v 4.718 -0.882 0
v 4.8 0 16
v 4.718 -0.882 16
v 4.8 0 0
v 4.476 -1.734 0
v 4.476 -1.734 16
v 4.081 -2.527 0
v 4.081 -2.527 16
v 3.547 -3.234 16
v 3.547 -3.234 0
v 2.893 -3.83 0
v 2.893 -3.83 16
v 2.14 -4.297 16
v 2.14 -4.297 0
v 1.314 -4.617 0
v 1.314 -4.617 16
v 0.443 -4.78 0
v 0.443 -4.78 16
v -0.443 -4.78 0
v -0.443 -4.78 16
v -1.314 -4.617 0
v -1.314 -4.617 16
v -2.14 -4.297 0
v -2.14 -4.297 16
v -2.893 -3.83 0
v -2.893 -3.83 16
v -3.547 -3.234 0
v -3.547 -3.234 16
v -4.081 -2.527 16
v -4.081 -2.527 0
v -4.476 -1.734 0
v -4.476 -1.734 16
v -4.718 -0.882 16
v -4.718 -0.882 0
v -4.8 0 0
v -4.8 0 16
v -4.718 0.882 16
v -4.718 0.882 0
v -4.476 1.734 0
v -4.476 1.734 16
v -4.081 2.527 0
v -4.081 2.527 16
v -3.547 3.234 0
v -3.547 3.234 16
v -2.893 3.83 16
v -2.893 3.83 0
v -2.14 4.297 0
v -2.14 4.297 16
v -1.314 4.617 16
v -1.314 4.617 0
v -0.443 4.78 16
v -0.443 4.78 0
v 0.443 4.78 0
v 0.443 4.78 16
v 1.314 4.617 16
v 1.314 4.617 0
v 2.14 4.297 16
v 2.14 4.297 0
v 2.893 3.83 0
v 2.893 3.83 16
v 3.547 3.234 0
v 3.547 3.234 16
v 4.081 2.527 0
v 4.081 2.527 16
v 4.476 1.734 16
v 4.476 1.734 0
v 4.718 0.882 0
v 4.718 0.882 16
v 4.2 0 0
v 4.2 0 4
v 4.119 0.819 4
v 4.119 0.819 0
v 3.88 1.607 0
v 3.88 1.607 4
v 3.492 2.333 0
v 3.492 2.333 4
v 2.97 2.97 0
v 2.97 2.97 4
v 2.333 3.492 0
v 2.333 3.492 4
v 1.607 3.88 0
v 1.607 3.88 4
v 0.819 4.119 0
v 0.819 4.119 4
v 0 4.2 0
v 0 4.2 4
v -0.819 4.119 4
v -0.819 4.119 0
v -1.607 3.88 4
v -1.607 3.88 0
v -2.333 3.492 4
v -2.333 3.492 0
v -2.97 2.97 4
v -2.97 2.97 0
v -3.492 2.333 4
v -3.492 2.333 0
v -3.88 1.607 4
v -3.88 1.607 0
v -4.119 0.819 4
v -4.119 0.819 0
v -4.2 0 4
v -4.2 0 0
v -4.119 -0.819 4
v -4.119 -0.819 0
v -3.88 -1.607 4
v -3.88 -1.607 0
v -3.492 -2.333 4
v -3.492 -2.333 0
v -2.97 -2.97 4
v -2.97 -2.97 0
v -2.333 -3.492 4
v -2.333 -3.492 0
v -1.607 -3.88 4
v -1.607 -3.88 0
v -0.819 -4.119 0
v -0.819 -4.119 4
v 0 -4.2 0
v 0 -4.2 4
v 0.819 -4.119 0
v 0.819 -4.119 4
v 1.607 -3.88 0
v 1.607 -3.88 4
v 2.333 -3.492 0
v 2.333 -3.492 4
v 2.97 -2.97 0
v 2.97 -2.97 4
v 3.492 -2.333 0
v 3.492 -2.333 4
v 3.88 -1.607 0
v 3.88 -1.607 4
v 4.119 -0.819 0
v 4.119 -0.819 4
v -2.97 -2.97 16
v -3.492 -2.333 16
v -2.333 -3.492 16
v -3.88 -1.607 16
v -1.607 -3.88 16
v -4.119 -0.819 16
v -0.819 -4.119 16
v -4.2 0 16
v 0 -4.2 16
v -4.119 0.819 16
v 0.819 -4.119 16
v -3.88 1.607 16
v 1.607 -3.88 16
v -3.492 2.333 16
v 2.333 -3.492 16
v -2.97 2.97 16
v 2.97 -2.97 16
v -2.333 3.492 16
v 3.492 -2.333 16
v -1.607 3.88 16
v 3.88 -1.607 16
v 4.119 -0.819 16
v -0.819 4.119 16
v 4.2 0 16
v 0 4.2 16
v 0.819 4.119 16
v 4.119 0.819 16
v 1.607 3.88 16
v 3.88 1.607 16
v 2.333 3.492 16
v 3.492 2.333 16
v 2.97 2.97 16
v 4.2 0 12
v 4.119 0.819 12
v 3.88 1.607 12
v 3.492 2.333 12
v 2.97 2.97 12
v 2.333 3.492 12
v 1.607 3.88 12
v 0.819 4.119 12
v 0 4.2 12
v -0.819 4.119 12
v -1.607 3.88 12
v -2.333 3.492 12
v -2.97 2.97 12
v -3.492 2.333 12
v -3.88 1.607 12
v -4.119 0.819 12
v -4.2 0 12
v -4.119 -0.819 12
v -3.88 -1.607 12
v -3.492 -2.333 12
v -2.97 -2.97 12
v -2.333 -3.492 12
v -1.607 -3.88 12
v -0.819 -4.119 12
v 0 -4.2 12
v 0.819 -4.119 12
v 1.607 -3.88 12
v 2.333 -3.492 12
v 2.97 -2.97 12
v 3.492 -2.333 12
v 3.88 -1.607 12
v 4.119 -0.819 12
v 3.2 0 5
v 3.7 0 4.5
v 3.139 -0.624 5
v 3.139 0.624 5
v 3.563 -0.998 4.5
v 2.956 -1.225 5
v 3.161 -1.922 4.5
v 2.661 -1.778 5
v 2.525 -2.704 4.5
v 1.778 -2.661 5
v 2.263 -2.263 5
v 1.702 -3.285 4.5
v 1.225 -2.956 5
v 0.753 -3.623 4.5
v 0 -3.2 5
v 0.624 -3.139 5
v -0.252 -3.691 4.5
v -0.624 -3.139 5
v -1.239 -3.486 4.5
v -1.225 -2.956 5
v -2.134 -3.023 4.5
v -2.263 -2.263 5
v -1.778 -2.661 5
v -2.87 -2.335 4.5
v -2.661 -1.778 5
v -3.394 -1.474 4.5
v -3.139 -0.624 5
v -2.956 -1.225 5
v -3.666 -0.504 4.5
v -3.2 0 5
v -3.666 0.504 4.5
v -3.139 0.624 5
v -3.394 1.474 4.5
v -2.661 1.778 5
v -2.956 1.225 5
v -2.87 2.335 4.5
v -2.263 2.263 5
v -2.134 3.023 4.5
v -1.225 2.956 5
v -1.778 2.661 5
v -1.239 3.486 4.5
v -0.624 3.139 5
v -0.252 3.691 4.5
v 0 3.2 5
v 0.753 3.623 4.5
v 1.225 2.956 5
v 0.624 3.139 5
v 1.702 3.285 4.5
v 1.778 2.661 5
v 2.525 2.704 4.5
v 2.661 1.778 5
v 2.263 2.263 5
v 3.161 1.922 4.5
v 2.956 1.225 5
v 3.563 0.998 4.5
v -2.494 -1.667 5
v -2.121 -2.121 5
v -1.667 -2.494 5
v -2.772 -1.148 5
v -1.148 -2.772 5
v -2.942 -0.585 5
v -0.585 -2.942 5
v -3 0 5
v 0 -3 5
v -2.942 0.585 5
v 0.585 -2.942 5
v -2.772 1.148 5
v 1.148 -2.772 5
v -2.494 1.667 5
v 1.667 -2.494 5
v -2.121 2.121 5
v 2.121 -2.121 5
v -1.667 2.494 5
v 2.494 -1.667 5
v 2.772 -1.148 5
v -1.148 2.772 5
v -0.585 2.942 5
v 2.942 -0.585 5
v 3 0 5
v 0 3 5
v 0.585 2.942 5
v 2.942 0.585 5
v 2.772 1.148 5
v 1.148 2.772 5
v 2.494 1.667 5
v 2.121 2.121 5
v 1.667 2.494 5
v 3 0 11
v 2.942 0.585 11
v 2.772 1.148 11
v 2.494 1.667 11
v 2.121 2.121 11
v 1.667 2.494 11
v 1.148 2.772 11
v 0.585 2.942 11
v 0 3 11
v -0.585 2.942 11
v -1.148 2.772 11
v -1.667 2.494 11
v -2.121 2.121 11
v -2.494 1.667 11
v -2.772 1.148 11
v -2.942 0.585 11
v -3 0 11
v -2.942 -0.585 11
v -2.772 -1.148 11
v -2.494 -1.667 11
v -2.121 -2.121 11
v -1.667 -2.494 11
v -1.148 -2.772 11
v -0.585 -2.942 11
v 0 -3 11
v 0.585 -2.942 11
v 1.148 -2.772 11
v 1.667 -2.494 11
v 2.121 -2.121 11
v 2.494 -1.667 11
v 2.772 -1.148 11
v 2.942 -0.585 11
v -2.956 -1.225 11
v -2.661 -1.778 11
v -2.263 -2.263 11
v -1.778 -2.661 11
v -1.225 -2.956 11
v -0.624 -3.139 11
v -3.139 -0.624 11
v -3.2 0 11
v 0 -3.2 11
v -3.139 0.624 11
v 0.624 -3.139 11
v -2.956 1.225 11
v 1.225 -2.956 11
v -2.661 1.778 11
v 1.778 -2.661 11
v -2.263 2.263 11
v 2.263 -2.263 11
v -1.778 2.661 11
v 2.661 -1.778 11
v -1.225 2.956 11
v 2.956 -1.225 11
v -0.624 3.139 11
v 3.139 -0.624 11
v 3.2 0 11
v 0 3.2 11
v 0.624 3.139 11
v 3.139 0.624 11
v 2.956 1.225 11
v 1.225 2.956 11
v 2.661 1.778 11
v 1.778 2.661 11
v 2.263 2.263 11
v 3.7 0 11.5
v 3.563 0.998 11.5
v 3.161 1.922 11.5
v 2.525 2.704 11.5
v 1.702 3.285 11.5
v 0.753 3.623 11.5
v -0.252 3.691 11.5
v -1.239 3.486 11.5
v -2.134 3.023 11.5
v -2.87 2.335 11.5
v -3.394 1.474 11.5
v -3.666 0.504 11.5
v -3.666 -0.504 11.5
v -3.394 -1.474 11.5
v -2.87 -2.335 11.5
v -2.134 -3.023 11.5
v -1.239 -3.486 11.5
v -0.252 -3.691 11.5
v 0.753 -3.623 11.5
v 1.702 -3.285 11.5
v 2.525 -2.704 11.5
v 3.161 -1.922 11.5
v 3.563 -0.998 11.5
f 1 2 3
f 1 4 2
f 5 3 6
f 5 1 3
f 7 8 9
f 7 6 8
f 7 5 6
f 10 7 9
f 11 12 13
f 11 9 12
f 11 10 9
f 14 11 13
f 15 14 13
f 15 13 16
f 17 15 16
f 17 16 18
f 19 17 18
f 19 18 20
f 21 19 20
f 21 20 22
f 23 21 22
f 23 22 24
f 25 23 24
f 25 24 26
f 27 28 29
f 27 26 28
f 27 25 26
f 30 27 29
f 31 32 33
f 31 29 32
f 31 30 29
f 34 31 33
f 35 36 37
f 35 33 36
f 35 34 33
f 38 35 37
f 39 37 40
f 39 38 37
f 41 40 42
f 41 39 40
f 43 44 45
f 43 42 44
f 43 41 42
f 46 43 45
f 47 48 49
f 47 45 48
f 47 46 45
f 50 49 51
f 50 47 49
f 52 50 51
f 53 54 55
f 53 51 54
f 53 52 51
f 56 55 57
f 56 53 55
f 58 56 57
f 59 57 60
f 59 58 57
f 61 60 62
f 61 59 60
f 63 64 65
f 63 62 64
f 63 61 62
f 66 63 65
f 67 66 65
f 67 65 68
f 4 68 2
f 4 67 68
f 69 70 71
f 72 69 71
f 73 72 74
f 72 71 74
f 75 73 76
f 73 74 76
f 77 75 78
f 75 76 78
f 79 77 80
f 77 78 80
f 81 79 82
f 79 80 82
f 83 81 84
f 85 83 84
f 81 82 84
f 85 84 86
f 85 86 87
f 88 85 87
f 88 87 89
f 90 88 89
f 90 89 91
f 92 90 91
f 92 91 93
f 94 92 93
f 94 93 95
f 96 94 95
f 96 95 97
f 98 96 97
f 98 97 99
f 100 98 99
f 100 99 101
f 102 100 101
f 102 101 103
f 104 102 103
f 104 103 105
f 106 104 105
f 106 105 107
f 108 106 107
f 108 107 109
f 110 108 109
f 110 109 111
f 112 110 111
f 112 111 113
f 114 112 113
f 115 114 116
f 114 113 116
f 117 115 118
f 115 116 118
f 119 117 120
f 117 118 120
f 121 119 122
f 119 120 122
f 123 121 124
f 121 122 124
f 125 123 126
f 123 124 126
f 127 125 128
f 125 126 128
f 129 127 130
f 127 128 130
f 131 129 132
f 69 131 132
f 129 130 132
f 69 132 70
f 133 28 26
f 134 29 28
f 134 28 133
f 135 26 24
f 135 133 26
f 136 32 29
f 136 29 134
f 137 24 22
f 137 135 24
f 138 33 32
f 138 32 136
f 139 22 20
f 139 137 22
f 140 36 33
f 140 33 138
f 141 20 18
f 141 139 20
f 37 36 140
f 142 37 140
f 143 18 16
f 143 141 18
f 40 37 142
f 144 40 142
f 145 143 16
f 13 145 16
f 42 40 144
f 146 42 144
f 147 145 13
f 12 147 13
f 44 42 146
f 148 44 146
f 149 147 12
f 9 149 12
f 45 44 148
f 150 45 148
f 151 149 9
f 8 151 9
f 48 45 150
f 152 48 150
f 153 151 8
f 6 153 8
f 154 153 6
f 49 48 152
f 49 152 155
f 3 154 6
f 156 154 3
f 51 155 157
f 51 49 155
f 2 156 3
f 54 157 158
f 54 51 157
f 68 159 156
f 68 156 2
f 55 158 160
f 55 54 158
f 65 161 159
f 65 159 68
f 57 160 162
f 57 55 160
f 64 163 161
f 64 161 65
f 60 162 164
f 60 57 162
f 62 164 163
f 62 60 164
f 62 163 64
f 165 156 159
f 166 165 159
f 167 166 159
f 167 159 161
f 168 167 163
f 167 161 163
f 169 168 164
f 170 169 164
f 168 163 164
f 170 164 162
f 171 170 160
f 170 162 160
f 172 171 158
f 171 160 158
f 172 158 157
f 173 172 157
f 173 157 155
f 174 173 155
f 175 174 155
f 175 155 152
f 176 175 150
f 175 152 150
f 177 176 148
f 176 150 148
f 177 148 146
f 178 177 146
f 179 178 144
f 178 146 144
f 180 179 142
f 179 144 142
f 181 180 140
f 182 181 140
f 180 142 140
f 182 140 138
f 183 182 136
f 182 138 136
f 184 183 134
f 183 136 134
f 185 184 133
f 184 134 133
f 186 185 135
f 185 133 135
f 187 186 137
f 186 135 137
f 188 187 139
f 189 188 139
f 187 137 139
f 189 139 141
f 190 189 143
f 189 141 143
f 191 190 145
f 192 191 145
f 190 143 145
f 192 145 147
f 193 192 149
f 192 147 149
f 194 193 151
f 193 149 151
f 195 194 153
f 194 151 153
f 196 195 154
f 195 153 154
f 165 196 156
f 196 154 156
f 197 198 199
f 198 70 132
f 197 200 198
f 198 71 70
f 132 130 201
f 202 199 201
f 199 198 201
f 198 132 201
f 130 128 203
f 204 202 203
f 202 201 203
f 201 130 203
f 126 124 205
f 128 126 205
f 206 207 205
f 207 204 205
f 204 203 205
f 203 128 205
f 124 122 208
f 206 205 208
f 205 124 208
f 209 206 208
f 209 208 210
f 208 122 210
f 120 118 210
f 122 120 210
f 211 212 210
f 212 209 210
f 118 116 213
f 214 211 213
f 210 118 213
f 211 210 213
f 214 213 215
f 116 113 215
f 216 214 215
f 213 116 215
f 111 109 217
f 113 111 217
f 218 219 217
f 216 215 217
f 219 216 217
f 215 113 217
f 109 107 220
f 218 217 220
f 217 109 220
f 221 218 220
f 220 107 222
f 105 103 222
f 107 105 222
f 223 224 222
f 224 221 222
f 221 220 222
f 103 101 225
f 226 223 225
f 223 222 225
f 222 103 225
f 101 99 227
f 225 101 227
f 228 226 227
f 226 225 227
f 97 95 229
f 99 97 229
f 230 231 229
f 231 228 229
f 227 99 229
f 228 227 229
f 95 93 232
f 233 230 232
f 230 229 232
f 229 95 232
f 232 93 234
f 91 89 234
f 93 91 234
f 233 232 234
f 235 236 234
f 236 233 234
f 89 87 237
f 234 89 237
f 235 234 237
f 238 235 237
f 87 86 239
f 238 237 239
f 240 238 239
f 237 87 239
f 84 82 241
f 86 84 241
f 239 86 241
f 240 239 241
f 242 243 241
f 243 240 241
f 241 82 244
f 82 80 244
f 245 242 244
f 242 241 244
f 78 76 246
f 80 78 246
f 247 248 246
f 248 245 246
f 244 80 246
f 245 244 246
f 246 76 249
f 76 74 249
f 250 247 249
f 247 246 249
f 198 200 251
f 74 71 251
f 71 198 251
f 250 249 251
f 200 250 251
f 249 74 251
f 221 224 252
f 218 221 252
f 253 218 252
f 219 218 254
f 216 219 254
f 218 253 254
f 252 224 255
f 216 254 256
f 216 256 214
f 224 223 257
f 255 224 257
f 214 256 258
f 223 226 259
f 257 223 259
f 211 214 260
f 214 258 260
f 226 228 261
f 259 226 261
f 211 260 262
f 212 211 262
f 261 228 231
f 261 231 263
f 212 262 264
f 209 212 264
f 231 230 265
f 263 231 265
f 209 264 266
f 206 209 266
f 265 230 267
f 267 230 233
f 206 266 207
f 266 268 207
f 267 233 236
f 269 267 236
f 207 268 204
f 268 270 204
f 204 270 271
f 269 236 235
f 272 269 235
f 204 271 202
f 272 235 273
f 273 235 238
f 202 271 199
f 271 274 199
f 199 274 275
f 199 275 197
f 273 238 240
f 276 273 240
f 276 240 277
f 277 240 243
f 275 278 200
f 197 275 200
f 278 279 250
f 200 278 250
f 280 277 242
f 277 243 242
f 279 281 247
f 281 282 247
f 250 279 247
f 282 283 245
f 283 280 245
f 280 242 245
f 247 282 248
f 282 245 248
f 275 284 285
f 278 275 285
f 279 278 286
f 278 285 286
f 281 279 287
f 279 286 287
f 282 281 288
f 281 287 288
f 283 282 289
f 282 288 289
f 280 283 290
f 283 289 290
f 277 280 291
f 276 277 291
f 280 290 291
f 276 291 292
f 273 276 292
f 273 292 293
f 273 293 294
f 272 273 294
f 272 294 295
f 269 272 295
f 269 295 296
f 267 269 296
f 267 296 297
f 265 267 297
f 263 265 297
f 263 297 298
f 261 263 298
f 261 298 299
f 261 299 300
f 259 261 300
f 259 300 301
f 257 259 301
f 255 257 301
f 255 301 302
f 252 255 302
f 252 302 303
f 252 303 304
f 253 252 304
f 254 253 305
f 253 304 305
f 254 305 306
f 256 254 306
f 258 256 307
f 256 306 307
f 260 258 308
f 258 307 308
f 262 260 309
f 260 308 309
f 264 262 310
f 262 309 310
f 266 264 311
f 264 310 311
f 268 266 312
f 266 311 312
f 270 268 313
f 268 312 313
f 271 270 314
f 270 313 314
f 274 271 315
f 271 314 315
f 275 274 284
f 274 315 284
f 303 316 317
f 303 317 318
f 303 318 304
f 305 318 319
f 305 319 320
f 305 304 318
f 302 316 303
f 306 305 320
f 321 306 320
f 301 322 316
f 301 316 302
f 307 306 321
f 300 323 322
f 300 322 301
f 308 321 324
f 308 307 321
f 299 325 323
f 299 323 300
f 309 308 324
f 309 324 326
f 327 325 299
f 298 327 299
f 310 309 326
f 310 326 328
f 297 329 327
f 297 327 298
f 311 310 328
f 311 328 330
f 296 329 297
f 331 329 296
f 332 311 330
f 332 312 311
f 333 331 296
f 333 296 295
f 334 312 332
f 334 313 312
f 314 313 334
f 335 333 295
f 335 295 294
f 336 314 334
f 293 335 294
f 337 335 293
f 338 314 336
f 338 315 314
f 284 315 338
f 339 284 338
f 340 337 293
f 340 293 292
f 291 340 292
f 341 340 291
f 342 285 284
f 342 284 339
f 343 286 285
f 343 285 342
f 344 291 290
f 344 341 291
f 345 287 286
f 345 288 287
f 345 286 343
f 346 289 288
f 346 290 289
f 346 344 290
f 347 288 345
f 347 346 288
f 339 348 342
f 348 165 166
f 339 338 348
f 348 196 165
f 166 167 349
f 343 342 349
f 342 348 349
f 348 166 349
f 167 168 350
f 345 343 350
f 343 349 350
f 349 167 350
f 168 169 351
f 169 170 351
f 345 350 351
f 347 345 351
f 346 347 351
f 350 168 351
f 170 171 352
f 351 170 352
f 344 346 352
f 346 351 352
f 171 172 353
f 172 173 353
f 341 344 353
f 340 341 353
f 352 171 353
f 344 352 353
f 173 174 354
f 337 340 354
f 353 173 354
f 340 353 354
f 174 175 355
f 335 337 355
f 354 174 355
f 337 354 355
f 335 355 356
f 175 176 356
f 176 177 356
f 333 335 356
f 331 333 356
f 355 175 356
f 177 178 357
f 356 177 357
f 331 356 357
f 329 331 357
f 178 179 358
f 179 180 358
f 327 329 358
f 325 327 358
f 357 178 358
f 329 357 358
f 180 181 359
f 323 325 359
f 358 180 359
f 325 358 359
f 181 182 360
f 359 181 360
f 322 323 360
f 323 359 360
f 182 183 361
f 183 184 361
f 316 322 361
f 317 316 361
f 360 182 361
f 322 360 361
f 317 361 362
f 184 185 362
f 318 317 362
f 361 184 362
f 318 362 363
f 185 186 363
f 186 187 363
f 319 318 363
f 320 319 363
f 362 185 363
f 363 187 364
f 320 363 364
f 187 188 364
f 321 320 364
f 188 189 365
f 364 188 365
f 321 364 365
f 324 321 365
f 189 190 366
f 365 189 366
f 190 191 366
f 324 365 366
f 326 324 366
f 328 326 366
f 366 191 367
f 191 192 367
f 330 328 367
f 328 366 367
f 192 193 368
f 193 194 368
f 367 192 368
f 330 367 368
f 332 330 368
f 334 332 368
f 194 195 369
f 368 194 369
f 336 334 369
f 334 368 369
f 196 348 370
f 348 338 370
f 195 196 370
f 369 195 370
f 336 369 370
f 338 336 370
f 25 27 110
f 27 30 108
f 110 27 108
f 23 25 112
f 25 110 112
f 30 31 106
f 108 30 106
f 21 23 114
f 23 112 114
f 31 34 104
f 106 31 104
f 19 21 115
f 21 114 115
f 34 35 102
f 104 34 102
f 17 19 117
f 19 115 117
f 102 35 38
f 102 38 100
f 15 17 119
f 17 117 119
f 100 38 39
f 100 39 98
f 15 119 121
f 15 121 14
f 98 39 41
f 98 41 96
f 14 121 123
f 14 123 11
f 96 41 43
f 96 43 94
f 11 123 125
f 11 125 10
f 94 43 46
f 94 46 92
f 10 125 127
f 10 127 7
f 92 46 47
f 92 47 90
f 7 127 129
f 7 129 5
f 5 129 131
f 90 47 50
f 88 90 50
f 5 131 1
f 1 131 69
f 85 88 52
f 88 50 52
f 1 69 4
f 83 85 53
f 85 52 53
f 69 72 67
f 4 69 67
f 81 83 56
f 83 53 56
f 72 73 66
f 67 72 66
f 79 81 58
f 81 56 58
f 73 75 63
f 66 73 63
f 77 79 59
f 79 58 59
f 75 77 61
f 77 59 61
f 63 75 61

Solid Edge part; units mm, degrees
sketch "Sketch1" plane through (0, 0, 0) normal (0, -1, 0) x (1, 0, 0)
  line L0 (3, 11) -> (4.2, 11)
  line L1 (4.2, 11) -> (4.2, 16)
  line L2 (4.2, 16) -> (4.8, 16)
  line L3 (4.8, 16) -> (4.8, 0)
  line L4 (4.8, 0) -> (4.2, 0)
  line L5 (4.2, 0) -> (4.2, 5)
  line L6 (4.2, 5) -> (3, 5)
  line L7 (3, 5) -> (3, 11)
revolve "RevolvedProtrusion1" add sketch "Sketch1" angle 360 about axis through (0, 0, 0.6598) along (0, 0, 1)
chamfer "Chamfer1" distance 1 angle 45 2 edges at (-4.2, 0, 5) (-4.2, 0, 11)
